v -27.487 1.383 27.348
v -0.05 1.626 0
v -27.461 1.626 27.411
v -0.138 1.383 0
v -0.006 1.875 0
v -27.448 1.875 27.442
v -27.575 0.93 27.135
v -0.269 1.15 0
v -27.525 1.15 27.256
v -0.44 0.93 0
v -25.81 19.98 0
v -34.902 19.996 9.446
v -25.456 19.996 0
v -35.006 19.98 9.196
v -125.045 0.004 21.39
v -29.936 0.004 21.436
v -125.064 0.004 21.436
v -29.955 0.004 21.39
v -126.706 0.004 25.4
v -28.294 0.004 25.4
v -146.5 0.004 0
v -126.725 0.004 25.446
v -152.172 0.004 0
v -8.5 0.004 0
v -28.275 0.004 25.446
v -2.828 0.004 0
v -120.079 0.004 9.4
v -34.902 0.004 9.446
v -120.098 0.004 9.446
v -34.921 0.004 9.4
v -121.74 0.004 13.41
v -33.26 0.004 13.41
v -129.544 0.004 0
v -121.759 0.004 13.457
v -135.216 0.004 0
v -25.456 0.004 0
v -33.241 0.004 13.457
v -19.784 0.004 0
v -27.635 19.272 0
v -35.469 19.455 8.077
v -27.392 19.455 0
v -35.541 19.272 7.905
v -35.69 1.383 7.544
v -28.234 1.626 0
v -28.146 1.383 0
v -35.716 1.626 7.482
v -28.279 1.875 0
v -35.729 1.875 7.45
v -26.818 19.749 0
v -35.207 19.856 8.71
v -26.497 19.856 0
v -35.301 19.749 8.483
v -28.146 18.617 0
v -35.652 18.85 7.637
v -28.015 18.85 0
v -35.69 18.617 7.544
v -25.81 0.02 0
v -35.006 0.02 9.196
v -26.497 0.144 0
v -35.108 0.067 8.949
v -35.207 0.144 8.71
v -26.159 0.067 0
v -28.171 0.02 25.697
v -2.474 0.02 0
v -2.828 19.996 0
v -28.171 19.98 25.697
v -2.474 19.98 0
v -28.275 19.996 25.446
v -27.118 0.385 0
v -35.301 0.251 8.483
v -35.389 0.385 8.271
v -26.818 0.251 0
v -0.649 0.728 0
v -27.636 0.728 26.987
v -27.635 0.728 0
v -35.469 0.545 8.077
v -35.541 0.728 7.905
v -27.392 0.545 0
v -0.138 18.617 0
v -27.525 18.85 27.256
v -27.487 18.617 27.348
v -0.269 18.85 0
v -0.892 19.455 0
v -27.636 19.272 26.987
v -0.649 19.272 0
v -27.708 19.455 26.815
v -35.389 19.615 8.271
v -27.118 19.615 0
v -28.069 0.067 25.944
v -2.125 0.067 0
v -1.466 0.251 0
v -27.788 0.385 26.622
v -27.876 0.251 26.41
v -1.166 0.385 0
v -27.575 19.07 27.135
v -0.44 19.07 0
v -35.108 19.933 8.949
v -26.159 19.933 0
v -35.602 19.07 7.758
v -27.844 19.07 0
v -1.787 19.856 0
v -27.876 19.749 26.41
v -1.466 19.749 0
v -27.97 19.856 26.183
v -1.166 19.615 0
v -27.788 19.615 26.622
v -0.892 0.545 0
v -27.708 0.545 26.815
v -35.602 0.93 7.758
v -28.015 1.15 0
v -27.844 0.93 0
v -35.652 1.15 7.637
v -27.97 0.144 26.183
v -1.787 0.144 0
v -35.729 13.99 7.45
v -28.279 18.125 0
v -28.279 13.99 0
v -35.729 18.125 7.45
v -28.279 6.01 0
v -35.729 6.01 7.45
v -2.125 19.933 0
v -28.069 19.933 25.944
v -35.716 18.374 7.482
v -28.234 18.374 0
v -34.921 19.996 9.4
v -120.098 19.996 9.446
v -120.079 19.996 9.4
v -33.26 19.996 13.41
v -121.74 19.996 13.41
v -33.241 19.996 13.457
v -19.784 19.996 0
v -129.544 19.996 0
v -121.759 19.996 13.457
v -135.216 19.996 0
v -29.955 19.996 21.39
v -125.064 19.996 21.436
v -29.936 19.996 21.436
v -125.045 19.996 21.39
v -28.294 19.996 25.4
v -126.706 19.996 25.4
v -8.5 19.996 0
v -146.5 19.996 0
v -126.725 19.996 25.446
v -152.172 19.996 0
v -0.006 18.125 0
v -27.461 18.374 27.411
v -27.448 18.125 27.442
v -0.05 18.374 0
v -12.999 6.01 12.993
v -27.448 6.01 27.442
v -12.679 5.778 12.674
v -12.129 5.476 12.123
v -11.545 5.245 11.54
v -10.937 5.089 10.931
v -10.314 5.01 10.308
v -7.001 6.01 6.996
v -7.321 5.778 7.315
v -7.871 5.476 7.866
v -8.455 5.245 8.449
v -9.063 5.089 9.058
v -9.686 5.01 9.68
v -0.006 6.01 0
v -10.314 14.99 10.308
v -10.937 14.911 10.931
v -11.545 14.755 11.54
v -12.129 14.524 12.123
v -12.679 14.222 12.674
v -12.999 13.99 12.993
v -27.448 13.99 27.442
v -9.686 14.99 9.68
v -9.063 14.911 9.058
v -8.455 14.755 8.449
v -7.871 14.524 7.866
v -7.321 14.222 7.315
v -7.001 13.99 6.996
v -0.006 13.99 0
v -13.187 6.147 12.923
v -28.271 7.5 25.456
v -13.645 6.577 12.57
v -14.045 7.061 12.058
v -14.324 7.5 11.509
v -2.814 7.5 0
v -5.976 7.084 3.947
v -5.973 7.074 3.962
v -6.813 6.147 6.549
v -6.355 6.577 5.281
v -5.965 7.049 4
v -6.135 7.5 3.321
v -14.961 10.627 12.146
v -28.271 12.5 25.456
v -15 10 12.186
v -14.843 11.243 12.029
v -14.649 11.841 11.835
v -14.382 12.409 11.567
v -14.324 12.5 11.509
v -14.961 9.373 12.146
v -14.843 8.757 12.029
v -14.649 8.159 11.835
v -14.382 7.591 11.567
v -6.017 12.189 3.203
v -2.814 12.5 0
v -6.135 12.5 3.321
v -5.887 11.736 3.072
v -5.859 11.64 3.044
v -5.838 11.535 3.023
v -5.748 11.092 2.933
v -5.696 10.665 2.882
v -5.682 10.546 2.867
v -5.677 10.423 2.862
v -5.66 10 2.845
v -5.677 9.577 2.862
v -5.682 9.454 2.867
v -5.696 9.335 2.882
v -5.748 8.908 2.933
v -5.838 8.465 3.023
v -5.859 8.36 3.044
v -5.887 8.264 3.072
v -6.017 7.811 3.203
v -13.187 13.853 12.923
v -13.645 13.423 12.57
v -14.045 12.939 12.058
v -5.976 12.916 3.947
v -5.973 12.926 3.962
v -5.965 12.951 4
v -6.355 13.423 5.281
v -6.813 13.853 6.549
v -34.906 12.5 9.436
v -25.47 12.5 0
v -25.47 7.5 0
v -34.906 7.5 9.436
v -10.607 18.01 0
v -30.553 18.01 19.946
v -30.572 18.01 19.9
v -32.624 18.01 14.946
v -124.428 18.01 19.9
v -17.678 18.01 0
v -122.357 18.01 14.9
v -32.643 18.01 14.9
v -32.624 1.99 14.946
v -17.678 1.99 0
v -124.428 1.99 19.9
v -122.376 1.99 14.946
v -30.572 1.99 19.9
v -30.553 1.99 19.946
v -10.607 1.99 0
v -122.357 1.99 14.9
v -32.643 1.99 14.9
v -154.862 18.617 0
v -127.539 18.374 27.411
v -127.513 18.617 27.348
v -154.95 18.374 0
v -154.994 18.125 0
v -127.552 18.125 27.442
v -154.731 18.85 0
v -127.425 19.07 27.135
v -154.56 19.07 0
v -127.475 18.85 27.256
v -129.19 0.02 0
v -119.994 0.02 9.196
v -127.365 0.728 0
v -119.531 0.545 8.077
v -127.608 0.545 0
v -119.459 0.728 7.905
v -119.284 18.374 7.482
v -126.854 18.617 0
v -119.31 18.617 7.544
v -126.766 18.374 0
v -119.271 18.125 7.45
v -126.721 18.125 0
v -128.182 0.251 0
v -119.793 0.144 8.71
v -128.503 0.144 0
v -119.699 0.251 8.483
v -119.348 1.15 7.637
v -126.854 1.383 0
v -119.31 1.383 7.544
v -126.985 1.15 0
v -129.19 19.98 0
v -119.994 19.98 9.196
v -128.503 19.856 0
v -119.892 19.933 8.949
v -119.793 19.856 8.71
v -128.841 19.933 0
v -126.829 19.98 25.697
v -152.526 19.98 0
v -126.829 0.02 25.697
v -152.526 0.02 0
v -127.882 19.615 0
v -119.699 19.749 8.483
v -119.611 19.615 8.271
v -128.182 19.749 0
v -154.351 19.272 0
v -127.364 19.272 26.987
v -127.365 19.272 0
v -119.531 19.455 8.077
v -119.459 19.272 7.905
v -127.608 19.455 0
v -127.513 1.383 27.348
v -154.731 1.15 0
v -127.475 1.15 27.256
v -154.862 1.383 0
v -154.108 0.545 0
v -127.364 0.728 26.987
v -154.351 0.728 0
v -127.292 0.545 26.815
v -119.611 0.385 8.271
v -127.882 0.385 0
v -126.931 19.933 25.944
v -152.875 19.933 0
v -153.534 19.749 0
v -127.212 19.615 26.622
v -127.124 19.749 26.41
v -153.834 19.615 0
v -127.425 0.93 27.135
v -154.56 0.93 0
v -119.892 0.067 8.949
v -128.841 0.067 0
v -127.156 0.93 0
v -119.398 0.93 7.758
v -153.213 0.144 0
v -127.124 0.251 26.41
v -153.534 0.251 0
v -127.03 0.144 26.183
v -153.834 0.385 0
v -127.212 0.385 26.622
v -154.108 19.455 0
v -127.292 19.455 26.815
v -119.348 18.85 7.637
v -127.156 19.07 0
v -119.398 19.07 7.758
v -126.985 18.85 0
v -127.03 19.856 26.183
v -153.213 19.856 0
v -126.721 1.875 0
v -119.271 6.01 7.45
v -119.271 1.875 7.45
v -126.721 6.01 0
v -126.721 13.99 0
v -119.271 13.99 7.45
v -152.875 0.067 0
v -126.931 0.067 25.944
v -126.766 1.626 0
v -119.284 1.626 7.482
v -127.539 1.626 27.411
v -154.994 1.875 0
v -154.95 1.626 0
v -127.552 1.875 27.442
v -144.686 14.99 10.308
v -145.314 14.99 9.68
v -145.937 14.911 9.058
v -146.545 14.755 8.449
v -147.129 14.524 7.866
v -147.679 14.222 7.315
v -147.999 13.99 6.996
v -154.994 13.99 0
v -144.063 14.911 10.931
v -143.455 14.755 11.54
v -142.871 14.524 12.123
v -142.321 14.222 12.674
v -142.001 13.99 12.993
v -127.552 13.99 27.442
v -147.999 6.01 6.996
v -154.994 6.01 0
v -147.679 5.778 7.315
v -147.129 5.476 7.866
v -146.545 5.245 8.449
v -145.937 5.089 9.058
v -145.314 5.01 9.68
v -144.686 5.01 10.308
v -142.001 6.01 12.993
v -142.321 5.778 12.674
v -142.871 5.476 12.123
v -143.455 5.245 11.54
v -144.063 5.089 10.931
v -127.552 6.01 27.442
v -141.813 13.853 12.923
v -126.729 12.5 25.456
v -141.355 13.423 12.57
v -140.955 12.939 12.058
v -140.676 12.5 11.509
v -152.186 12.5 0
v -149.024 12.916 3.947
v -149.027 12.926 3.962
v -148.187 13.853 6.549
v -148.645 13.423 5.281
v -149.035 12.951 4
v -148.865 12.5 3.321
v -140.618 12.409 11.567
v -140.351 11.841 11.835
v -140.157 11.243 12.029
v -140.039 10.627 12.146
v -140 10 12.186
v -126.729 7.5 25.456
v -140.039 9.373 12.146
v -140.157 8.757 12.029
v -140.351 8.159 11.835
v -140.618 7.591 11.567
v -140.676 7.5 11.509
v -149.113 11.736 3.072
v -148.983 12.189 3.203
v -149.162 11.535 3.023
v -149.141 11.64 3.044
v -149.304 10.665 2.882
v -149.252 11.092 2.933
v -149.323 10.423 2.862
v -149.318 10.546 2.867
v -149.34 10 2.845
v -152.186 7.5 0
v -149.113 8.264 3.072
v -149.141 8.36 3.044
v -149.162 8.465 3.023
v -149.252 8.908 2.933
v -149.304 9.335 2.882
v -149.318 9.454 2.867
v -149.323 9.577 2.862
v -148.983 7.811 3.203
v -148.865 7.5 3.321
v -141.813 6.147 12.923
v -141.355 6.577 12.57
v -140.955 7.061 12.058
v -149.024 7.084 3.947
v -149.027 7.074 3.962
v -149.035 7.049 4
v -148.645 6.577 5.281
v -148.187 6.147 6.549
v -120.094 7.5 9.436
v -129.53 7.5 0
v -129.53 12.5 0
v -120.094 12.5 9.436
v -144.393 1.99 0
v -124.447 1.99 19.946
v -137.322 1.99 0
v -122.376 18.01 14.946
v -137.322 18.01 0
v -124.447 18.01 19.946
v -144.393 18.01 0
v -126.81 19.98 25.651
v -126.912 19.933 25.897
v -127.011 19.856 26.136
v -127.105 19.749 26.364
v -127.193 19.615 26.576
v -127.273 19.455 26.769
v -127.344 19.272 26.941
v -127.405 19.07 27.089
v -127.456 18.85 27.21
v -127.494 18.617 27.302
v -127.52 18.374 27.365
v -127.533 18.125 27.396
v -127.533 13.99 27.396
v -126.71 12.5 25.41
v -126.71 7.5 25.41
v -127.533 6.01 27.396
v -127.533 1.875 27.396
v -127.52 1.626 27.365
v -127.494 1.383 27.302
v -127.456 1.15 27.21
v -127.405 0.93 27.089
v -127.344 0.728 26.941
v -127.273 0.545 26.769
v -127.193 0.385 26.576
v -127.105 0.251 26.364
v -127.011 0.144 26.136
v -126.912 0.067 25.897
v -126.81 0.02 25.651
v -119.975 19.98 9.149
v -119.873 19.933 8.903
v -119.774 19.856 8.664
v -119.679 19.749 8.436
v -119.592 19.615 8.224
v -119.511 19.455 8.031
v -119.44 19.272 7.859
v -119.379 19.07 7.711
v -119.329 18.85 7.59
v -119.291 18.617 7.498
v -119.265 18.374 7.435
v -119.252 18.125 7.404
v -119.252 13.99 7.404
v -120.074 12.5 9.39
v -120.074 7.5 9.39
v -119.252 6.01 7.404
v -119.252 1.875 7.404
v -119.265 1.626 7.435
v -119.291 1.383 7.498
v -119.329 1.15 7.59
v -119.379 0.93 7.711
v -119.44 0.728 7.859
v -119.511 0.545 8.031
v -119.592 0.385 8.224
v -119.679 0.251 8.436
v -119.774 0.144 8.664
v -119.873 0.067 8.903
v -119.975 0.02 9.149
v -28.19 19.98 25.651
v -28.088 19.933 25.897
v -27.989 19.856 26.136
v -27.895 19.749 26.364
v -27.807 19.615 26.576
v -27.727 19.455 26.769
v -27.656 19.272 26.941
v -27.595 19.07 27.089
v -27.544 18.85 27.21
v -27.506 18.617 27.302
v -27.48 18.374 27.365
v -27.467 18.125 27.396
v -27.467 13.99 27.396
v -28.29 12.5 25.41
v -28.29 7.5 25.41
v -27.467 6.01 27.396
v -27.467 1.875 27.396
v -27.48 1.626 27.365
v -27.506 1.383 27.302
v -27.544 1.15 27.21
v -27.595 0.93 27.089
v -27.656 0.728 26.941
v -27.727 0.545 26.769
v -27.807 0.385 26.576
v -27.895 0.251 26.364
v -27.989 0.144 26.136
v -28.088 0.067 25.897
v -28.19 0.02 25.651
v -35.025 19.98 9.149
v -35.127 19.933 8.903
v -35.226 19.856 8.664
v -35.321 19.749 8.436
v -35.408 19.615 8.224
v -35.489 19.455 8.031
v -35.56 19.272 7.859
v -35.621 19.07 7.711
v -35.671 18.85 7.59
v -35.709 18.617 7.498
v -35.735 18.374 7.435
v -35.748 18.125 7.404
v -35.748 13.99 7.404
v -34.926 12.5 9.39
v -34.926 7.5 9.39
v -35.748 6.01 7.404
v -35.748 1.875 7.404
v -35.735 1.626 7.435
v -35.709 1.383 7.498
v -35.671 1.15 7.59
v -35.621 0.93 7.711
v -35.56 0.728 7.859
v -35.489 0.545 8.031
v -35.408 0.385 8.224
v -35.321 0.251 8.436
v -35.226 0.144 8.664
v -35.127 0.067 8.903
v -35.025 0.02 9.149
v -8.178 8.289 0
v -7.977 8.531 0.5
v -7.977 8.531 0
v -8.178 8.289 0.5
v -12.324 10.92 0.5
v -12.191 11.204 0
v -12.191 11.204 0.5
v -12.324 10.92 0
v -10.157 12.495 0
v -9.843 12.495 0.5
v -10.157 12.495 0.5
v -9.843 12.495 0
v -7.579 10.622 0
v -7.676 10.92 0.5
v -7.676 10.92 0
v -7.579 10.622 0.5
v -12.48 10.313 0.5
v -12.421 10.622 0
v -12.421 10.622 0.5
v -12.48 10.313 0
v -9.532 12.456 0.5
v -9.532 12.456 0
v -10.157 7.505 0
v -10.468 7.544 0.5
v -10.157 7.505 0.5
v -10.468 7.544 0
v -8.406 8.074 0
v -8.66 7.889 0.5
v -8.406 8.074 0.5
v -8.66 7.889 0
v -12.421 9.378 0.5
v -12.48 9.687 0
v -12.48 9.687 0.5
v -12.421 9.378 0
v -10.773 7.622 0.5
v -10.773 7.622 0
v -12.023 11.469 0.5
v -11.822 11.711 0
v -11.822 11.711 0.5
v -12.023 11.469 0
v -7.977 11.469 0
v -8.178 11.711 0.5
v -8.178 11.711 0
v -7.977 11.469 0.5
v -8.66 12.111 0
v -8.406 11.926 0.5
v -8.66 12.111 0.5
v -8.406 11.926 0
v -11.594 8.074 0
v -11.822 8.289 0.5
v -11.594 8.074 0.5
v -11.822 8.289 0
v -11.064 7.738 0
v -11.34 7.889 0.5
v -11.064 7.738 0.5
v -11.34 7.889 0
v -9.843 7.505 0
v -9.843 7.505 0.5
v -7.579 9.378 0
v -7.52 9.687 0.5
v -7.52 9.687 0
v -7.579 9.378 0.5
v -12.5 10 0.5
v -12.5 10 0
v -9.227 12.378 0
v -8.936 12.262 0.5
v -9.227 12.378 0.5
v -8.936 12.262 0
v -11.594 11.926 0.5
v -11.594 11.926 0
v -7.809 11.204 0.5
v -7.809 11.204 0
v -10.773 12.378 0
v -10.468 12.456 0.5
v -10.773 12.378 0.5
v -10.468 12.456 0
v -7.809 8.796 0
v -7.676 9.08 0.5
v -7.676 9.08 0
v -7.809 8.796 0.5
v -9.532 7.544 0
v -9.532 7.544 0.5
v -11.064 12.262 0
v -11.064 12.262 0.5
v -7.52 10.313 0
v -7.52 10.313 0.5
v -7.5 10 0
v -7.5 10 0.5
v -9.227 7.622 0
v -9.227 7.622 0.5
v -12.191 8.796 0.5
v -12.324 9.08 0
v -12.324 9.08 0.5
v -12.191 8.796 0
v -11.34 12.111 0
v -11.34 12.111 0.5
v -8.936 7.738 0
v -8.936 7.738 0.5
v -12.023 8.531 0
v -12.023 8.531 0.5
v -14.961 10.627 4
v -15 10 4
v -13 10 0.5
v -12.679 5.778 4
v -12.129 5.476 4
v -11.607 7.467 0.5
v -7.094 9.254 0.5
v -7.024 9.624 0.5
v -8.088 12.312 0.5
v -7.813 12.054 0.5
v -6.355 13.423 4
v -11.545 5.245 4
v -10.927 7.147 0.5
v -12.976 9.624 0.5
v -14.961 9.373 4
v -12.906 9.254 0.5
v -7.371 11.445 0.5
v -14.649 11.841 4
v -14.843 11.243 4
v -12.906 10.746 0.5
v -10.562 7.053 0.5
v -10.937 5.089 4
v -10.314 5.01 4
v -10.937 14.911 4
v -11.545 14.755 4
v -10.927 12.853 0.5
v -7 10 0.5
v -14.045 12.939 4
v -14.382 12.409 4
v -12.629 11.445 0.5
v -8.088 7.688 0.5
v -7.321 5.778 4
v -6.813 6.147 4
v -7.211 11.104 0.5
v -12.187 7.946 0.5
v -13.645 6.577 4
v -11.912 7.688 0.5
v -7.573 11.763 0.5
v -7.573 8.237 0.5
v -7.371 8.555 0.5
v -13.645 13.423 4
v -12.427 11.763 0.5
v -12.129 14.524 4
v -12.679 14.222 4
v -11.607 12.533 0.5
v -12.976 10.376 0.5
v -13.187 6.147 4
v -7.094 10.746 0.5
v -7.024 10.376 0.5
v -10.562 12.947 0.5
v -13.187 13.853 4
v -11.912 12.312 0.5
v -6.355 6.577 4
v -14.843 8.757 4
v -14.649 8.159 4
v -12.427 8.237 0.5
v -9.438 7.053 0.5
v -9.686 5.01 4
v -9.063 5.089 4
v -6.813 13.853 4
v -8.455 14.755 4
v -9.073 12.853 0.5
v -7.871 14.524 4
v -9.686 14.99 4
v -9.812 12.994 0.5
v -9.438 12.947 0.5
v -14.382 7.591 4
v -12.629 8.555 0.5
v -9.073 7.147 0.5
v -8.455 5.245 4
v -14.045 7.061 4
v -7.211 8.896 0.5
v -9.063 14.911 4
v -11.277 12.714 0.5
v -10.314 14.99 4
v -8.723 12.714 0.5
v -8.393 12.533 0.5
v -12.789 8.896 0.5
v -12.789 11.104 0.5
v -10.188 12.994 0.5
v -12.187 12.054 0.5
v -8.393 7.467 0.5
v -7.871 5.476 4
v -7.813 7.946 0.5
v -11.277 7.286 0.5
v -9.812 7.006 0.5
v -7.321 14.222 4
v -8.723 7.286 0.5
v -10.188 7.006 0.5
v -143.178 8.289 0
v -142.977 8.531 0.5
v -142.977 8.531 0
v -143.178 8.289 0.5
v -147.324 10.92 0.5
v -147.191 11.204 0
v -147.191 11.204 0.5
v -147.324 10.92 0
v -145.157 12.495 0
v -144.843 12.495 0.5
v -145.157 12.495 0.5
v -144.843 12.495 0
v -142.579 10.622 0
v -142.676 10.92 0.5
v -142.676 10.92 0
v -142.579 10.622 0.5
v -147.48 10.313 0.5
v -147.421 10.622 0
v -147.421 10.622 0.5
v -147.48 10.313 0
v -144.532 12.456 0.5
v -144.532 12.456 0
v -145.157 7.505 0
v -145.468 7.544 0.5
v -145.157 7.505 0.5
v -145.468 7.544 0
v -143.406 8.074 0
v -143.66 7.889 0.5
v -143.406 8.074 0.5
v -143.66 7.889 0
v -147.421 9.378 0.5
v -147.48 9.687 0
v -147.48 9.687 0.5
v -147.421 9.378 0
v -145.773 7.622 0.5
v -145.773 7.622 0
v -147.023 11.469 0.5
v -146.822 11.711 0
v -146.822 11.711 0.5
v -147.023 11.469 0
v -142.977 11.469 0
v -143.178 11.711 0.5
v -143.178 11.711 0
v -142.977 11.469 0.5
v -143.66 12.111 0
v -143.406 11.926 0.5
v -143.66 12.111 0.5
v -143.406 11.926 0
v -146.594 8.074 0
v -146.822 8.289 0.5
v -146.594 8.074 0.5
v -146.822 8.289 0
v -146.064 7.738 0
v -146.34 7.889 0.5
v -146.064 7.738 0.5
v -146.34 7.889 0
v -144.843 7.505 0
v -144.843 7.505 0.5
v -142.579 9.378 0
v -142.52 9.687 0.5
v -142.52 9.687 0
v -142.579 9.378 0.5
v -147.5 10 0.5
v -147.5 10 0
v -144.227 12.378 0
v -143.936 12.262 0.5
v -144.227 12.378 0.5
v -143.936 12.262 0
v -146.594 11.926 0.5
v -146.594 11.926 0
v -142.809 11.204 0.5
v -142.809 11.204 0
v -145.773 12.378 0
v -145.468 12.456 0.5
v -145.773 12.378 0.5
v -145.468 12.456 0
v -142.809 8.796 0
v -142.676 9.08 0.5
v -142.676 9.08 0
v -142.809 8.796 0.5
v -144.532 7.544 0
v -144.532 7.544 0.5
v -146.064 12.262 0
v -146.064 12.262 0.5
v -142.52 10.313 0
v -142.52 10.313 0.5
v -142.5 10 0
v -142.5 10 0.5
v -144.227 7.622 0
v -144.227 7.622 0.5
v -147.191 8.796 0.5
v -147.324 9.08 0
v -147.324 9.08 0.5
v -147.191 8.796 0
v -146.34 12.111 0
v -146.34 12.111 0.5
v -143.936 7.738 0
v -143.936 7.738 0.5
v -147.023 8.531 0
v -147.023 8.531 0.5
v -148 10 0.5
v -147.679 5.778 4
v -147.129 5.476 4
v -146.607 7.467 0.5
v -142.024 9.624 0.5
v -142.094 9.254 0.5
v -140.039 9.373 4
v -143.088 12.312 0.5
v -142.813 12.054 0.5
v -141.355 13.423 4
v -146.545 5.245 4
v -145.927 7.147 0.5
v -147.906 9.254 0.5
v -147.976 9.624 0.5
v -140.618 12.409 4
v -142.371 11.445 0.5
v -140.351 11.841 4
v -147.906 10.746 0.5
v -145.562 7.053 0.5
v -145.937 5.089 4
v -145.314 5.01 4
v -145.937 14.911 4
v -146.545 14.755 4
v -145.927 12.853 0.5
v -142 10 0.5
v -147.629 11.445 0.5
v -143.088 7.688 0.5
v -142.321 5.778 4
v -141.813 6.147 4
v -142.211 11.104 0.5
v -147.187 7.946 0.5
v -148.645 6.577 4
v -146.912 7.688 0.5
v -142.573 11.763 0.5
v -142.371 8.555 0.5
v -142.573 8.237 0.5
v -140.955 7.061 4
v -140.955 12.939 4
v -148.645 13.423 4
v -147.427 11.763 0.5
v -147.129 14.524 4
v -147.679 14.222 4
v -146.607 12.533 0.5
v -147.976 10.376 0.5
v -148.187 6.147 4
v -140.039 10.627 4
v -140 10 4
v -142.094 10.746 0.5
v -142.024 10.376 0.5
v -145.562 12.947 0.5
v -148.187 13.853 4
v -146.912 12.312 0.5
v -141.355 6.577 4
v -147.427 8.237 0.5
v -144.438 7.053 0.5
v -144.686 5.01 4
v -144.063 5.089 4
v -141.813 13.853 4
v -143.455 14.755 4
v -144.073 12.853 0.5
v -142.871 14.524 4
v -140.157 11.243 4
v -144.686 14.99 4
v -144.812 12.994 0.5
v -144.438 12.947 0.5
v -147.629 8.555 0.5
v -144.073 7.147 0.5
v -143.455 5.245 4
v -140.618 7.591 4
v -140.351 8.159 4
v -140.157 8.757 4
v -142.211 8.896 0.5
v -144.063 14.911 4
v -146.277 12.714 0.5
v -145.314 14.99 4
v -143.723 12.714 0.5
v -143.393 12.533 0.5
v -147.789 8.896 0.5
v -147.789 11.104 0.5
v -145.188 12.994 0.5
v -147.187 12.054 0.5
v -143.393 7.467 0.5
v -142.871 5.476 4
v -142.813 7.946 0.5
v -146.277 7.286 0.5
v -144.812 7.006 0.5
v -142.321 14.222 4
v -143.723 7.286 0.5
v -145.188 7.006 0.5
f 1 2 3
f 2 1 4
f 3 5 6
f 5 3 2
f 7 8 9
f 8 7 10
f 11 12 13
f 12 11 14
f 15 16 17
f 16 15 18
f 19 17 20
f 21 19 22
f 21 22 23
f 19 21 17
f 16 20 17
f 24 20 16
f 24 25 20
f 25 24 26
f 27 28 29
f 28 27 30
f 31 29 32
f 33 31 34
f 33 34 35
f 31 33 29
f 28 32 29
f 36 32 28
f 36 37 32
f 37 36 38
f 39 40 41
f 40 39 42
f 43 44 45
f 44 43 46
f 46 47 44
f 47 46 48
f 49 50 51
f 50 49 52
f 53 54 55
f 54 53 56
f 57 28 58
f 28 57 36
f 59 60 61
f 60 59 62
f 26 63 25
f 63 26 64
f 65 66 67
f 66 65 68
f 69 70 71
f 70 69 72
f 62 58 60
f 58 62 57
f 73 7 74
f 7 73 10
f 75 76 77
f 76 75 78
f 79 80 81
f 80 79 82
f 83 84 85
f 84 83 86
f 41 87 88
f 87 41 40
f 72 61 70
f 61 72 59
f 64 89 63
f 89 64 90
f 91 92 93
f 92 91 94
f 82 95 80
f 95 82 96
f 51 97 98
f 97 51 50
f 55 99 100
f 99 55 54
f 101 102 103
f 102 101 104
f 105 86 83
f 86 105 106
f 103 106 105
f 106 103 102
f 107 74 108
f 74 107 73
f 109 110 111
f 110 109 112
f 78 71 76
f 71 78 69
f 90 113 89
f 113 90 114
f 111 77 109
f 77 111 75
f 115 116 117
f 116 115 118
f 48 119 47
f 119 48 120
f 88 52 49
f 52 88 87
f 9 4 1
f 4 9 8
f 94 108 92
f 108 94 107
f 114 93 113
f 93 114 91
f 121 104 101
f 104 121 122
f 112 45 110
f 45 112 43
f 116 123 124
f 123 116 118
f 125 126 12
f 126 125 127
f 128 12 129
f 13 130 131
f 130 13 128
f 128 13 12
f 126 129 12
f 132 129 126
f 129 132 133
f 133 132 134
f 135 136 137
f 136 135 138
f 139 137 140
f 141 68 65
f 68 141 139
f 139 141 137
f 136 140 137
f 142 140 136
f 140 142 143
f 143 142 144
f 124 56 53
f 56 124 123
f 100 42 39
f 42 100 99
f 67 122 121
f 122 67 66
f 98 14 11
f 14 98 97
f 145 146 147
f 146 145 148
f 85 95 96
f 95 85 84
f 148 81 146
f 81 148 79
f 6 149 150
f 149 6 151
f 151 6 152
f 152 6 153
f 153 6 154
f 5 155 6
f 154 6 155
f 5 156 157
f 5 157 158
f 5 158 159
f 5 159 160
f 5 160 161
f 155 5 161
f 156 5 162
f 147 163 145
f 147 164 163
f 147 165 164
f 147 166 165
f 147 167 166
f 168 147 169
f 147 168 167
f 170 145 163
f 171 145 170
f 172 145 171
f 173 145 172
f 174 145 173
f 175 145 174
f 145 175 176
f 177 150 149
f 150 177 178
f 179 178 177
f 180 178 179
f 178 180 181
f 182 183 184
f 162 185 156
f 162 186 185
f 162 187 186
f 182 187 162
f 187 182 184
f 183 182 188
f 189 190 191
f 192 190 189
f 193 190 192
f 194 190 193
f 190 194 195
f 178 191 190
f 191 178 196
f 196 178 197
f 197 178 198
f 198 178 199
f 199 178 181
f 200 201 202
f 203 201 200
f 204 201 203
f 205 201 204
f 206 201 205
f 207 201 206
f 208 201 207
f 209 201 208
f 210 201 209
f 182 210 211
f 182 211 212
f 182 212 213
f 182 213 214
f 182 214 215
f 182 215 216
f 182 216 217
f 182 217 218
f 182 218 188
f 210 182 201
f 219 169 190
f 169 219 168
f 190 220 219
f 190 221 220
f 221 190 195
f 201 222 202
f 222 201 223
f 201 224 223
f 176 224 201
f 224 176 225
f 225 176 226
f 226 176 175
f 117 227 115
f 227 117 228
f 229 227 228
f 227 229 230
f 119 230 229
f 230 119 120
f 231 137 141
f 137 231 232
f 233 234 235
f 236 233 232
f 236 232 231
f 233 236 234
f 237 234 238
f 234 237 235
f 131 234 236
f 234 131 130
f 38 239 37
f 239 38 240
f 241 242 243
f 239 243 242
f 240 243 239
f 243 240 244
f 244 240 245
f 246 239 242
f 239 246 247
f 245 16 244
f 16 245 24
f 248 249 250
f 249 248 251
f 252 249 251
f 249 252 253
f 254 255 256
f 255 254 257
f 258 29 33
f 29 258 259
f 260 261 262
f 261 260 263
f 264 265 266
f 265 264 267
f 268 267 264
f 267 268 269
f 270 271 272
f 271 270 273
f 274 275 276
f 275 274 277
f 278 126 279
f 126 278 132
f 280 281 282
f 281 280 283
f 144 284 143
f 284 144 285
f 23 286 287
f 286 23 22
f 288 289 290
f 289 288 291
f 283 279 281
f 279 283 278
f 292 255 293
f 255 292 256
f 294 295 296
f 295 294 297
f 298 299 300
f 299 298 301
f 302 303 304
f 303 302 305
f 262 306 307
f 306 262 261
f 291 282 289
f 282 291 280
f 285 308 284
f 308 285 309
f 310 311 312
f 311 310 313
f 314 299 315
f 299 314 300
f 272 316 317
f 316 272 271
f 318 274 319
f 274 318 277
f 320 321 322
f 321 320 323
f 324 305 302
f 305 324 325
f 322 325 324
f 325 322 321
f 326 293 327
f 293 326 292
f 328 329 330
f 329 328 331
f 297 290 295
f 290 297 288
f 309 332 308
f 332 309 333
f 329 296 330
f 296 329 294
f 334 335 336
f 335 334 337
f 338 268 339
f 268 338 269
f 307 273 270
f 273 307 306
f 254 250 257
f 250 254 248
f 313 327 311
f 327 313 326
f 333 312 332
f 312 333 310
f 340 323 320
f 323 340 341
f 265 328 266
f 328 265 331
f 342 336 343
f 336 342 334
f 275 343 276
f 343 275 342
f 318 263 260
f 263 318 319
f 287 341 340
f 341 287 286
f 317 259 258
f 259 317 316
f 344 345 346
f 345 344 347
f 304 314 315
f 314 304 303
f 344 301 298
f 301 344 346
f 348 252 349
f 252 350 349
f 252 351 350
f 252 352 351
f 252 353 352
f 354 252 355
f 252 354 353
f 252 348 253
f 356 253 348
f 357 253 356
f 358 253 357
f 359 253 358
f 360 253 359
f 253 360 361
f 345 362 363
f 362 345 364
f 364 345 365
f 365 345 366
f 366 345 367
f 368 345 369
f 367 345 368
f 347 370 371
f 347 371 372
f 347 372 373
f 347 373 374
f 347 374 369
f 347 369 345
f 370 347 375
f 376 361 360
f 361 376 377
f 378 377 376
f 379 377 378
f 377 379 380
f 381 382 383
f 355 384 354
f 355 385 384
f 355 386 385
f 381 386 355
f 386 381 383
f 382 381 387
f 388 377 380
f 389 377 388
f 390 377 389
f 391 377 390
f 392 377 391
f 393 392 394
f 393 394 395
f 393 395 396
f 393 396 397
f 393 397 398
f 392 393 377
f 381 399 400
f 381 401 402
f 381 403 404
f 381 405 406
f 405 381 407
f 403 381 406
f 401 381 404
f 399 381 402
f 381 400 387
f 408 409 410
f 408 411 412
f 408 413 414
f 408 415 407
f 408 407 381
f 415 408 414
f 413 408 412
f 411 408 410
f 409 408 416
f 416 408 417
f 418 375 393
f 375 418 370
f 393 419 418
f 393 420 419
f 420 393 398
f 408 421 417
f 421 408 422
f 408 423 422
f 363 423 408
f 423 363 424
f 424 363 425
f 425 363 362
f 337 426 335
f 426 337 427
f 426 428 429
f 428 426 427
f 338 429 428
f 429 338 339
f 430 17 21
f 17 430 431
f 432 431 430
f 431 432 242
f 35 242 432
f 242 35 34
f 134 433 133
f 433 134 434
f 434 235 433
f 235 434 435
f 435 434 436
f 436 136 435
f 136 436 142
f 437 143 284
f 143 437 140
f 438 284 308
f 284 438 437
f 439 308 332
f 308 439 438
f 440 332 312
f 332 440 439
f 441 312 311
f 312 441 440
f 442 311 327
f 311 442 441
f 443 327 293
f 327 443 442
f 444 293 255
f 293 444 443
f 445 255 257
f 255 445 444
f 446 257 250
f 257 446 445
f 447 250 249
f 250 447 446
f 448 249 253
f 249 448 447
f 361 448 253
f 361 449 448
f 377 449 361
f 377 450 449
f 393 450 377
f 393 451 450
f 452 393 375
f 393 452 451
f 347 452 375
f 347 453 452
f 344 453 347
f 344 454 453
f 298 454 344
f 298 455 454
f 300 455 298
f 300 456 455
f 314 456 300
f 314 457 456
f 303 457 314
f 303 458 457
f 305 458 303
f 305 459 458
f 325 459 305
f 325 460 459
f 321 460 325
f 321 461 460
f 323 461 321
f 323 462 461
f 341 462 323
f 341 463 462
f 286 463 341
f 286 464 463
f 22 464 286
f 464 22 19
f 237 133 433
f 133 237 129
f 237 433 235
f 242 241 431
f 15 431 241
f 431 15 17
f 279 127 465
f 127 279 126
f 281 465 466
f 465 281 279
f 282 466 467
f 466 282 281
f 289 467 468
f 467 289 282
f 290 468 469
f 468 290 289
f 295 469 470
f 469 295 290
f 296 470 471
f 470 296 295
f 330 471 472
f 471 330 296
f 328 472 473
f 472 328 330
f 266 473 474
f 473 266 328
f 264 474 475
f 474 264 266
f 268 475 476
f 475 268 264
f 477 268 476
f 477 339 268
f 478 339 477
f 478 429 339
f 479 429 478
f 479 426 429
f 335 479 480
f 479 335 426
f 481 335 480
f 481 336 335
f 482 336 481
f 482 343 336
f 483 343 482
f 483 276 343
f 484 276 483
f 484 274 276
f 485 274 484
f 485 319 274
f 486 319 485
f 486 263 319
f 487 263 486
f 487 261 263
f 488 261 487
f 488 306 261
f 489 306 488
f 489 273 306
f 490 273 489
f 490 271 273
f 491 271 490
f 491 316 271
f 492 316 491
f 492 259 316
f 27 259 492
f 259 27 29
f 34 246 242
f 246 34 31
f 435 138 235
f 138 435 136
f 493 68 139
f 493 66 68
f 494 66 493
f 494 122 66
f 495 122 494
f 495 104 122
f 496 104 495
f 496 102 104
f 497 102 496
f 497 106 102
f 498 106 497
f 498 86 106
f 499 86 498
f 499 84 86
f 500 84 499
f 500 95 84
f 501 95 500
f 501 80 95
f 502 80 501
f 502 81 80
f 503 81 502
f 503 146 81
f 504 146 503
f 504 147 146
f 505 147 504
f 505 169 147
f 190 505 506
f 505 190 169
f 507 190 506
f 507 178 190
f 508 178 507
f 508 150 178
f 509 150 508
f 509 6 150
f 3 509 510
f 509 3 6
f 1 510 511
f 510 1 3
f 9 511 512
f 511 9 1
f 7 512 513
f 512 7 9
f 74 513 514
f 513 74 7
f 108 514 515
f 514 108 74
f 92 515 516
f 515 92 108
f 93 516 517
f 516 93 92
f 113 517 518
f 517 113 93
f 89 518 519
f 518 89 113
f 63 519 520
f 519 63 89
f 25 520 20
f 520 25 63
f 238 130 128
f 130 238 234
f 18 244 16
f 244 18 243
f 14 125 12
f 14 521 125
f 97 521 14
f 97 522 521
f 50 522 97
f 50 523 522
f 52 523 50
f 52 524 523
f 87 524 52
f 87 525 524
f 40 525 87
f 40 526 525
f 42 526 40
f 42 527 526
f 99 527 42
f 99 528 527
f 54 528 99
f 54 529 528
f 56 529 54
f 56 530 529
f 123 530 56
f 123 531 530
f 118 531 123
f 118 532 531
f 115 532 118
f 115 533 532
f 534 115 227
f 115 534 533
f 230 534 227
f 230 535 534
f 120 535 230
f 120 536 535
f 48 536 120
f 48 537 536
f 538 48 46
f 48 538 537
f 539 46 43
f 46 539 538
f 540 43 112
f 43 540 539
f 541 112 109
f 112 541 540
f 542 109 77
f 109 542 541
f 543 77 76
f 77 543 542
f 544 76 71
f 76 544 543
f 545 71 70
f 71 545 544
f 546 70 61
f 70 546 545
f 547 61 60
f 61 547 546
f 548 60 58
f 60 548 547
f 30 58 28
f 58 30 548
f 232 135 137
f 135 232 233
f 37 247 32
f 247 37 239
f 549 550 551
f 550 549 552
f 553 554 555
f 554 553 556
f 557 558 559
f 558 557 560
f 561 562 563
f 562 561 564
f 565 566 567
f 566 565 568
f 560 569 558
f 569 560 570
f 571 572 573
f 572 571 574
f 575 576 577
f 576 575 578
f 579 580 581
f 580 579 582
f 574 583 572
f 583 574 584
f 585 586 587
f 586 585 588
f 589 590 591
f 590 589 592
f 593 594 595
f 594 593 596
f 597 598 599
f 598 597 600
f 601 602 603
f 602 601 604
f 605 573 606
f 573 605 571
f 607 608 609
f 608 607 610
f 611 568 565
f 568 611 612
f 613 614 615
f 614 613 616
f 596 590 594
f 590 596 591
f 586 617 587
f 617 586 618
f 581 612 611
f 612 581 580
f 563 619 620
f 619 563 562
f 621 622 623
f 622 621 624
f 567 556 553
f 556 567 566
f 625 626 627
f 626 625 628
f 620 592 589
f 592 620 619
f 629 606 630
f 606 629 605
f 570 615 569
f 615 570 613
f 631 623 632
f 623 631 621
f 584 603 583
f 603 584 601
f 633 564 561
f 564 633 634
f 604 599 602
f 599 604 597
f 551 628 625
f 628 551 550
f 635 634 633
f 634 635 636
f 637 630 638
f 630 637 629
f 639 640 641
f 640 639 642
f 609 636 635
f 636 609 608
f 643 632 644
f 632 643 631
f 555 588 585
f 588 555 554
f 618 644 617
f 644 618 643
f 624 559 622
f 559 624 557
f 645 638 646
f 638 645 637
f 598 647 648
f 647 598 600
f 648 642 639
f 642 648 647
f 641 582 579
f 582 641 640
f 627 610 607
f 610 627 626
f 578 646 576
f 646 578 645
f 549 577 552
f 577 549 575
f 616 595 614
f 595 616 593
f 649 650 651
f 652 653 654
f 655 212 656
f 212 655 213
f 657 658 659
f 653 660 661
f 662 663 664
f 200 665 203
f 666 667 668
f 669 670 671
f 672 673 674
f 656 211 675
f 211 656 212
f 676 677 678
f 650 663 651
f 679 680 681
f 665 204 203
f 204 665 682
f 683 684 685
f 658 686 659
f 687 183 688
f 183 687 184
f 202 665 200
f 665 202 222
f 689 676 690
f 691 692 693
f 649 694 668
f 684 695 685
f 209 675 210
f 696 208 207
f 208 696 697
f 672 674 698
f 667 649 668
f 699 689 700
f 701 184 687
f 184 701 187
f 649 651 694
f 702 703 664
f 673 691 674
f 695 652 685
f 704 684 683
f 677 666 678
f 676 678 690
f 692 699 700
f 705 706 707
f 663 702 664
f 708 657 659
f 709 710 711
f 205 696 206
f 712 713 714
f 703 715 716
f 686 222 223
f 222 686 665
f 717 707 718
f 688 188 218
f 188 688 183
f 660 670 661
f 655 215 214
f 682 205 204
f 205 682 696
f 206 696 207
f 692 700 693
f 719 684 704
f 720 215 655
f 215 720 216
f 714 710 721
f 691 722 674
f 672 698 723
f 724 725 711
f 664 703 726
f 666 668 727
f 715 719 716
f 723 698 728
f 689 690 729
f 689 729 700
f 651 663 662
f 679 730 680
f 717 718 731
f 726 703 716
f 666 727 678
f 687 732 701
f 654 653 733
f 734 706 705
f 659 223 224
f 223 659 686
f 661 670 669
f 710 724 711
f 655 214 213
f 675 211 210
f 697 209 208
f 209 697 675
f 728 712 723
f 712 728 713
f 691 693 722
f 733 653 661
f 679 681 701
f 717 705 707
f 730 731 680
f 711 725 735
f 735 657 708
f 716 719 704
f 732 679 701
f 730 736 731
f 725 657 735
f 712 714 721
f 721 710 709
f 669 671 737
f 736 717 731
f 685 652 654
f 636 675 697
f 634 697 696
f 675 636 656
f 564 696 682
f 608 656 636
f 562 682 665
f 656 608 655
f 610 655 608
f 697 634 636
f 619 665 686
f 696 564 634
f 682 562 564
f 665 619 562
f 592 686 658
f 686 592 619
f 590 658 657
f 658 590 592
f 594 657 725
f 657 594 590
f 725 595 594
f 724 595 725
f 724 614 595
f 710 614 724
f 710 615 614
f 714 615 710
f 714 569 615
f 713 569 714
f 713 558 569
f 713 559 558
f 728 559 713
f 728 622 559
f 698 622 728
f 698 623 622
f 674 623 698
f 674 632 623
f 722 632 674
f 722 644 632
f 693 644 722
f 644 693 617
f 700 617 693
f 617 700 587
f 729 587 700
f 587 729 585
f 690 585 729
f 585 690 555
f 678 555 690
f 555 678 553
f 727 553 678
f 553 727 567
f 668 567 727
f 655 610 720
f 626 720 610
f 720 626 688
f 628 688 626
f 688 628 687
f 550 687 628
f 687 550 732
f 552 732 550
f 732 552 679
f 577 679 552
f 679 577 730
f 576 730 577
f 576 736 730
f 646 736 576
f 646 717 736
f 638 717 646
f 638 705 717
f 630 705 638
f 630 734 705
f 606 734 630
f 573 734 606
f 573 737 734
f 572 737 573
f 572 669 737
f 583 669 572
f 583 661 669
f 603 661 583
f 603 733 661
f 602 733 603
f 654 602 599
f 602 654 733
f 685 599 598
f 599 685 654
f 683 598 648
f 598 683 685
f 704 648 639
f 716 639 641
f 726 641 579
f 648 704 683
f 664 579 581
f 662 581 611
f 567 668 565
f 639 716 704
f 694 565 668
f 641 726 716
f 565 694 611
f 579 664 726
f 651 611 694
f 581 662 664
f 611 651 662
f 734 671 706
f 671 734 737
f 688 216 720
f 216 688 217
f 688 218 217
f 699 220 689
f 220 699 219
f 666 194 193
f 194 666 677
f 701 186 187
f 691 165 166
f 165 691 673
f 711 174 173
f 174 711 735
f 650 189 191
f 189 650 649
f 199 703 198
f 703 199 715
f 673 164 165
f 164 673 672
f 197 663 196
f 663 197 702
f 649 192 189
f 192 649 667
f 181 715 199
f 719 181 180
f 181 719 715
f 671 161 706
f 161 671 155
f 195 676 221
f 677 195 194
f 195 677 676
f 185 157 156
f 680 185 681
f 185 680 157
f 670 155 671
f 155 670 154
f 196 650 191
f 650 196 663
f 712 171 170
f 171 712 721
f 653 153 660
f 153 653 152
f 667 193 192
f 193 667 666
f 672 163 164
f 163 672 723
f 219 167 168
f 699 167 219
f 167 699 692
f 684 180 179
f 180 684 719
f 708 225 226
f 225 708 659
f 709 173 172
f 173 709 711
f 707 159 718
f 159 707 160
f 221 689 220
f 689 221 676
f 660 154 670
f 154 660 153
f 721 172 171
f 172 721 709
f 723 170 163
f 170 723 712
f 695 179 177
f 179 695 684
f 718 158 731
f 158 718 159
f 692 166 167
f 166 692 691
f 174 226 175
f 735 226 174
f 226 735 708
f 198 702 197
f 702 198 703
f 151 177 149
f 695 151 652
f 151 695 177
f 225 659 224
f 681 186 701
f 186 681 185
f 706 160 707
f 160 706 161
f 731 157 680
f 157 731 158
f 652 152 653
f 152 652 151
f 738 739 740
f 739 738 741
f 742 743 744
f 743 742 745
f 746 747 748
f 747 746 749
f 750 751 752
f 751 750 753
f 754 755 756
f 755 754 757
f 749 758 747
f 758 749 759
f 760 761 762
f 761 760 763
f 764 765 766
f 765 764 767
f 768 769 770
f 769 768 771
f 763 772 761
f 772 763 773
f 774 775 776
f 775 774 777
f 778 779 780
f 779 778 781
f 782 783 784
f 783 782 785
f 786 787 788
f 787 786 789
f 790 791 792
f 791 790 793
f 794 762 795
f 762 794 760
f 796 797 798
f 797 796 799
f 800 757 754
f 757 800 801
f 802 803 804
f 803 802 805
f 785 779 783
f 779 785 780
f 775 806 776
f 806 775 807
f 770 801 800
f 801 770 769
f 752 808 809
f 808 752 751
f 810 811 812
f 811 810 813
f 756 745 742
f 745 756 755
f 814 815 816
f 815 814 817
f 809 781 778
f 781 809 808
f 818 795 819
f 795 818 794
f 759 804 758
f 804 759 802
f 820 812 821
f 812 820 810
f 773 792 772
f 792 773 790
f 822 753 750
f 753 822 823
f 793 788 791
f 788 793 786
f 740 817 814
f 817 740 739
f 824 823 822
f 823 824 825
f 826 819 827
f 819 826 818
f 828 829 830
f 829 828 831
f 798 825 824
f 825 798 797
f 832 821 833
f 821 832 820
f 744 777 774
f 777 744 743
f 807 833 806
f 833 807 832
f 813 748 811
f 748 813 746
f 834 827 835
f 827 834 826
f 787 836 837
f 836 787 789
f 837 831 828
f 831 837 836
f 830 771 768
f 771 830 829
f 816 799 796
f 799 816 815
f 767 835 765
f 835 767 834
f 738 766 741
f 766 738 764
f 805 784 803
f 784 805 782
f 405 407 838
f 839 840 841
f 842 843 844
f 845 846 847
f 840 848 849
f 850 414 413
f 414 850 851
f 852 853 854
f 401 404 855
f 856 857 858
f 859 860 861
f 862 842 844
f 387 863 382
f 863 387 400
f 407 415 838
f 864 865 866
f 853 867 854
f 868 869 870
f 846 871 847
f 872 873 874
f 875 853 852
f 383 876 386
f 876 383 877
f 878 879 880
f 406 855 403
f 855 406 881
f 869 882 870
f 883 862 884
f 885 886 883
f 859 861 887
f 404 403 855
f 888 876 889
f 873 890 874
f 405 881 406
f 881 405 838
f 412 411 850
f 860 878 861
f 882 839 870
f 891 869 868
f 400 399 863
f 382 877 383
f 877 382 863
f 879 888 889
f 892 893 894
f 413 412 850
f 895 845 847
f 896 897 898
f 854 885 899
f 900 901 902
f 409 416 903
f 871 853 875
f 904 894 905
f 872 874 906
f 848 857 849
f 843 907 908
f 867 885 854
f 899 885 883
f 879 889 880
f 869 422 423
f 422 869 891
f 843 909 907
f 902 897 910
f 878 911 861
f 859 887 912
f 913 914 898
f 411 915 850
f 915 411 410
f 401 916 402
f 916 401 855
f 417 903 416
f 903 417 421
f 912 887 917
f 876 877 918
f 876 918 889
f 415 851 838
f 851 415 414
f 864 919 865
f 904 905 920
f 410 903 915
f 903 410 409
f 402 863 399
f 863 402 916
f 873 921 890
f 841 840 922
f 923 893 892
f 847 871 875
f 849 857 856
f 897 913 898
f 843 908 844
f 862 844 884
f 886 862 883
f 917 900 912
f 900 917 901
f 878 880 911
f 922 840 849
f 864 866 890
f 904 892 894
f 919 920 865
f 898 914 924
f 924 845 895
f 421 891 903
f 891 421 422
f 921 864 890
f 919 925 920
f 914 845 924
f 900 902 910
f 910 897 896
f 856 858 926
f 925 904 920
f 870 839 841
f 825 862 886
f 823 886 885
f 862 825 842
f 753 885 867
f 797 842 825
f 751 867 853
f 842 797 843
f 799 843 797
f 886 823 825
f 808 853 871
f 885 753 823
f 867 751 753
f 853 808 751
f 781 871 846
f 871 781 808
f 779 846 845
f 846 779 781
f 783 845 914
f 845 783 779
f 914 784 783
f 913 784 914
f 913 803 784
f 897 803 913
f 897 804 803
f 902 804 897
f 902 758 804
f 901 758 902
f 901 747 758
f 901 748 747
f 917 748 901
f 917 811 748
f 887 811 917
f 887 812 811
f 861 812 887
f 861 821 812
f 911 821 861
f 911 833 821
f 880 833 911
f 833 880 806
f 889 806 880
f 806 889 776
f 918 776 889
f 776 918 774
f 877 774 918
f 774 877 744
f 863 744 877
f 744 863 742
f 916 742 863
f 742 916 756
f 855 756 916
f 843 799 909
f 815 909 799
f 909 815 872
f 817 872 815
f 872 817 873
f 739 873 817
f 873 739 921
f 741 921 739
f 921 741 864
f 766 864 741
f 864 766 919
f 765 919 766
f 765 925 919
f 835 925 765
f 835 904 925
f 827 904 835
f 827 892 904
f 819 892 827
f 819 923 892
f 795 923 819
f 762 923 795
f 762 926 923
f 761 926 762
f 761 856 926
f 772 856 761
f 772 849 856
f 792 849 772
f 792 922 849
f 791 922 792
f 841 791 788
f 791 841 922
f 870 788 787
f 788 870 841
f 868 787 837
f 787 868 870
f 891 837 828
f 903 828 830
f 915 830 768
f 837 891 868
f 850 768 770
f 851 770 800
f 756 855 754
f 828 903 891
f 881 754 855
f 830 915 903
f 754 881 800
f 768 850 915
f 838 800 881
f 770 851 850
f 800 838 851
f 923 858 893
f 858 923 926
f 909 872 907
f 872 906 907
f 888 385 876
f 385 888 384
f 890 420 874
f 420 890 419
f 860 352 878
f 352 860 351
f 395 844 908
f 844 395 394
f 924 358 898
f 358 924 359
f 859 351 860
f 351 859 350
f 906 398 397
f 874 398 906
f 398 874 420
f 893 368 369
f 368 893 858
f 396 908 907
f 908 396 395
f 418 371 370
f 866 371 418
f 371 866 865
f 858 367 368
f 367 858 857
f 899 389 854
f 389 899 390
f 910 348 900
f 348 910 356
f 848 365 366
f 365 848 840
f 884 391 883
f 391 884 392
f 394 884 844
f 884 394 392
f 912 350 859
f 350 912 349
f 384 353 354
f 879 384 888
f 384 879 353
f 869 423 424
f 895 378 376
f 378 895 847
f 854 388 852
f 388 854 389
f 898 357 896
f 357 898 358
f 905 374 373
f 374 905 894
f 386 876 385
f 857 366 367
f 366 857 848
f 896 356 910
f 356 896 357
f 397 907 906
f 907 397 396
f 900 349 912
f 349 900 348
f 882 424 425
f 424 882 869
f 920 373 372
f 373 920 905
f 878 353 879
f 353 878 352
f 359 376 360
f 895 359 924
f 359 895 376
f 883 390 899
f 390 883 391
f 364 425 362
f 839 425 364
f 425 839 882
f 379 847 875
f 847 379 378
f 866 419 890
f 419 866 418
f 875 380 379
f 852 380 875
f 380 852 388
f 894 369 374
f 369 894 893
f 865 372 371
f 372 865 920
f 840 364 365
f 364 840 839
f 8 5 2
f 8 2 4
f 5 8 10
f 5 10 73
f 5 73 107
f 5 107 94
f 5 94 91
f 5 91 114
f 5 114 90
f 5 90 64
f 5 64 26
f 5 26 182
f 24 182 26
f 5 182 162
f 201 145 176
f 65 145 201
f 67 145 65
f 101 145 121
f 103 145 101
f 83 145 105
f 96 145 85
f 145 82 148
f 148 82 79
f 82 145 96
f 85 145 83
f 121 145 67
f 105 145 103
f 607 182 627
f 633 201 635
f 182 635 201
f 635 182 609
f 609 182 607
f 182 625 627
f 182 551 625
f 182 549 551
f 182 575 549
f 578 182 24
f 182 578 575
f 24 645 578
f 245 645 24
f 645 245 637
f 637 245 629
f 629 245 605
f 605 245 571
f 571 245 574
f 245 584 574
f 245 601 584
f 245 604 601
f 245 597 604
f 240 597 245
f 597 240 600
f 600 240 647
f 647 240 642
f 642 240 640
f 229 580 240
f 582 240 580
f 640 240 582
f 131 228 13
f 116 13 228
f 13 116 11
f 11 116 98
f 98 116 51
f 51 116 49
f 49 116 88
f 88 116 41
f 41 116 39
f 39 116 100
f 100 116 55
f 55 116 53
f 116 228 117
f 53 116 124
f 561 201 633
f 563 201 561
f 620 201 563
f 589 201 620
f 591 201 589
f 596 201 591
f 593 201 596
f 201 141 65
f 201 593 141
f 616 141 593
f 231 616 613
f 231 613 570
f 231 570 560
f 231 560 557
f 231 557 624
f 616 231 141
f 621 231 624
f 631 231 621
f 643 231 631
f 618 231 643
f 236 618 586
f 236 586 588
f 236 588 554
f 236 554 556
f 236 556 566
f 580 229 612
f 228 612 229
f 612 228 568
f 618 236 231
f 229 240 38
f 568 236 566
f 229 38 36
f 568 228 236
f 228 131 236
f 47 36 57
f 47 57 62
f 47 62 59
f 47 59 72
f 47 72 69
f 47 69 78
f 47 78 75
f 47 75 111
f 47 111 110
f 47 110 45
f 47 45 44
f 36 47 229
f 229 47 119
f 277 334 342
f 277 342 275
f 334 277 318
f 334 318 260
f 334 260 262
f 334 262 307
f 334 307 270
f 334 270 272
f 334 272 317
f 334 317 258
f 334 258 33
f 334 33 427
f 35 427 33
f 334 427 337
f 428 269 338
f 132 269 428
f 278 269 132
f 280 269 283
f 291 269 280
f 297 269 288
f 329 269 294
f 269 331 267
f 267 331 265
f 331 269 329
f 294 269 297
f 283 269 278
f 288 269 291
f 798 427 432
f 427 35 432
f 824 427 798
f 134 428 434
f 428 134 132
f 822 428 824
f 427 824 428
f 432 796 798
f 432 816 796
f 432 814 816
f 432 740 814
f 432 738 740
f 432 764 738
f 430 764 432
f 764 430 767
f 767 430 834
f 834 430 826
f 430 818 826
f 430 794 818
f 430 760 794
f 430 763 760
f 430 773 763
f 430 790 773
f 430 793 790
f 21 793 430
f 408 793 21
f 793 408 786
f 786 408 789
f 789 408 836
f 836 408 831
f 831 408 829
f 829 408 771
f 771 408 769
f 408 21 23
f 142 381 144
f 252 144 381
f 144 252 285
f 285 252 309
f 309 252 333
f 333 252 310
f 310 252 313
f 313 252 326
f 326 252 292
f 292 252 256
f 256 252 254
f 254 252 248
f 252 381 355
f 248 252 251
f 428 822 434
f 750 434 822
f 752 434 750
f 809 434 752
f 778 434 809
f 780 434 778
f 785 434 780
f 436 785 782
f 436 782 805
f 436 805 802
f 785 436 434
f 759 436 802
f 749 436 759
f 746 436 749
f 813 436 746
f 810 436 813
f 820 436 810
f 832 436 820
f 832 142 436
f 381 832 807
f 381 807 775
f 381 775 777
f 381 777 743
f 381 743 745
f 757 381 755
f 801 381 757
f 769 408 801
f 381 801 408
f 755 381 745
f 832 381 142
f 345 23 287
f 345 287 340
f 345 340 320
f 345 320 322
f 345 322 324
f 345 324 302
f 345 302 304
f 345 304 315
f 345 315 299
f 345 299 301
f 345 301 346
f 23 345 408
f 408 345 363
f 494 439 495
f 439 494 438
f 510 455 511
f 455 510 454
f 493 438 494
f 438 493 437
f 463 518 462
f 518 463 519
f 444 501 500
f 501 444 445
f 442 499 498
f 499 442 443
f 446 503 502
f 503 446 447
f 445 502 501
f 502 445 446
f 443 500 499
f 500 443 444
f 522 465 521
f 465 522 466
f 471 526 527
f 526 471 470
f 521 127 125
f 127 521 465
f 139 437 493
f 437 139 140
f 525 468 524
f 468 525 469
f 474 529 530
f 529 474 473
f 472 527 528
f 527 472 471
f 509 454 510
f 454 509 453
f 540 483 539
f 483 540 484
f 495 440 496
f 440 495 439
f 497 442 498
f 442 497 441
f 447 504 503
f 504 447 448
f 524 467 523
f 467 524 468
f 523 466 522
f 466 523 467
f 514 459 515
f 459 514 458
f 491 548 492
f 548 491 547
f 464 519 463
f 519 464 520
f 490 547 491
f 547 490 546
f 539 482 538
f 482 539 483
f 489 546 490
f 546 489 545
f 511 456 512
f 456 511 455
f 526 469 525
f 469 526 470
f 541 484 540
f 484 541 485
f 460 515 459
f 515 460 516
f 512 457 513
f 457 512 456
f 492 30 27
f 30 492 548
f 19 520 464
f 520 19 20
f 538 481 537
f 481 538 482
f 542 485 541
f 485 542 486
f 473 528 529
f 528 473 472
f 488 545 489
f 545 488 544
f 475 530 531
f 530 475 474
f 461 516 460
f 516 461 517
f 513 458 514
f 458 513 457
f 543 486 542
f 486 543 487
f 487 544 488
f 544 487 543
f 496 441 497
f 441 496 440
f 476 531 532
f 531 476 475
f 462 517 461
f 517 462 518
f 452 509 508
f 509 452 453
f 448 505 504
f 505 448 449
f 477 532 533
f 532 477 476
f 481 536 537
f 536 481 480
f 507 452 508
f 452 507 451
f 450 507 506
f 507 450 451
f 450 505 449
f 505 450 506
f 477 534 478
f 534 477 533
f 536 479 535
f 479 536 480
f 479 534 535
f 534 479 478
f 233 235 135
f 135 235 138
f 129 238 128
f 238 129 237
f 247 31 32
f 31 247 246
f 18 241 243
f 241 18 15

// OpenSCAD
// file: parts.scad
module chimney() {    
    for(i=[0:8:80]){
        echo(i);
        translate([20 + (width-80)/2  +i,-1,20]){
            minkowski(){
                cube([0.01,50,30]);    
                sphere(d=2,h=1);        
            }
        }
    }
}


module handlescrew(){
    translate([0,0,-39]){cylinder(d=5,h=40); }
    translate([0,0,-4]){cylinder(d1=10,d2=6,h=3.5);}
    translate([0,0,-34]){cylinder(d=10,h=30);}
}

module wedge(){
    translate([sixinch/2,-10,15]){
        rotate([0,45+45/2,0]){
            cube([80,80,30]);
        }
        translate([0,80,0]){
            rotate([0,45+45/2,180]){
                cube([80,80,30]);
            }
        }
        translate([-20,0,-100]){
            cube([40,80,100]);
        }
    }
}

module screw(){
    cylinder(r1=screw_head/2, r2=screw_dia/2, h=screw_head_height);
    cylinder(r=screw_dia/2, h=40);    
    translate([0,0,-0.99]){cylinder(r=screw_head/2, h=1);}    
}



module insideprofile(l){
    difference(){
        union(){
            translate([7.6,10,0]){cube([4.8,10,l]);}
            translate([0,7.6,0]){cube([20,4.8,l]);}  
            
            translate([6.5,10-2.1,0]){cube([7   ,10,l]);}
            translate([2.1,6.5,0]){cube([15.8,7   ,l]);}  
        }
        translate([4,4,-1]){
            cube([12,12,l+2]);
        }
    } 
    translate([20,20,0]){
        rotate([0,-90,0]){
            linear_extrude(20){
                polygon (points=[[0,0],[l,0],[0,l]]);
            }
        }
    }    
}

module extrusion(u,center,front,side){
    len=unit*u;
    difference(){
        translate([0,2,2]){
            minkowski(){
                cube([len,16,16]);
                sphere(d=4);
            }
        } 
        translate([-5,10,1.99]){
            rotate([0,90,0]){linear_extrude(len+10){polygon(points=[[0,-2.5],[2,-4],[2,4],[0,2.5]]);}}
        }
        translate([-5,10,18.01]){
            rotate([0,-90,180]){linear_extrude(len+10){polygon(points=[[0,-2.5],[2,-4],[2,4],[0,2.5]]);}}
        }    
        translate([-5,18.01,10]){
            rotate([90,0,90]){linear_extrude(len+10){polygon(points=[[0,-2.5],[2,-4],[2,4],[0,2.5]]);}}
        }    
        translate([-5,1.99,10]){
            rotate([-90,0,-90]){linear_extrude(len+10){polygon(points=[[0,-2.5],[2,-4],[2,4],[0,2.5]]);}}
        }    
        if(center){
            translate([-5,10,10]){
                rotate([0,90,0]){
                    cylinder(d=4.6,h=len+10);
                }
            }
        }     
        //holes
        if(front){
            for(i=[0:30]){
                translate([unit/2+i*unit,10,-5]){ cylinder(d=3.8,h=30);}
            }
        }    
        if(side){
            for(i=[0:30]){
                translate([unit/2+i*unit,25,10]){ rotate([90,0,0]){cylinder(d=3.8,h=30);}}
            }
        }
        //length cutoff
        translate([-2,0,0]){cube([4,60,60],center=true);}
        translate([len+2,0,0]){cube([4,60,60],center=true);}    
    }
}

module baseplate(u){
    difference(){
        union(){
            translate([1.25,1.25,1.25]){
                minkowski(){
                    cube([sixinch-2.5,unit*u-2.5,gauge-2.5]);
                    sphere(r=1.25);
                }
            }
        }
        //Rack mount holes
        translate([10-0.5,unit/2,-gauge/2])                 {cylinder(r=2.3,gauge*2);}
        translate([sixinch-10+0.5,unit/2,-gauge/2])         {cylinder(r=2.3,gauge*2);}
        translate([10-0.5,u*unit-(unit/2),-gauge/2])        {cylinder(r=2.3,gauge*2);}
        translate([sixinch-10+0.5,u*unit-(unit/2),-gauge/2]){cylinder(r=2.3,gauge*2);}
        if(u>=5){
            translate([10-0.5,(u*unit)/2,-gauge/2])         {cylinder(r=2.3,gauge*2);}
            translate([sixinch-10+0.5,(u*unit)/2,-gauge/2]) {cylinder(r=2.3,gauge*2);}
        }  
    }    
}
// file: config.scad
// This file contains all the parts for a rack enclosure
// It has the format required for a customizable project on Thingiverse
// Note: Calculated variables does not show up in the customizer, hence the *1; 

$fn = 50*1;

part = "f"; // [a:Extrusion no holes,b:Extrusion front holes,c:Extrusion front and side holes,d:End open,e:End grid,f:End chimney,g:End closed,h:Nut-less Trap,i:Panel,j:Panel with handle,k:Handle]


//Hole size for 4mm screws or freedom unit equivalent
Four_mm_screw = 3.8;

//Hole size for 5mm screws or freedom unit equivalent
Five_mm_screw = 4.8;

//Constants, do not change !
sixinch   = 155*1;       // cm = 6"  
width     = 155-20-20;   // 11.5cm between rails
unit      = (44.5/19)*6; // 1U = 14.05cm
gauge     = 3*1;
gauge_box = 2*1;
slip      = 0.35*1;      // extra slip between parts
Units=3;

include <parts.scad>;
// main file
include <config.scad>;
module tophandle(){
    rotate([0,180,0]){
        difference(){
            union(){
                rotate([0,45,0]){
                    extrusion(4,false,false,false);
                }
                translate([sixinch,20,0]){
                    rotate([0,45,180]){
                        extrusion(4,false,false,false);
                    }
                }
            }    
            wedge();            
            translate([90,90,10]){
                cube([200,200,20],center=true);
            }       
            translate([10,10,0]){handlescrew();}
            translate([sixinch-10,10,0]){handlescrew();}        
        }
        intersection(){
            translate([0,0,-27.4]){
                extrusion(11,false,false,false);
            }
            wedge();        
        } 
    }    
}

tophandle();
